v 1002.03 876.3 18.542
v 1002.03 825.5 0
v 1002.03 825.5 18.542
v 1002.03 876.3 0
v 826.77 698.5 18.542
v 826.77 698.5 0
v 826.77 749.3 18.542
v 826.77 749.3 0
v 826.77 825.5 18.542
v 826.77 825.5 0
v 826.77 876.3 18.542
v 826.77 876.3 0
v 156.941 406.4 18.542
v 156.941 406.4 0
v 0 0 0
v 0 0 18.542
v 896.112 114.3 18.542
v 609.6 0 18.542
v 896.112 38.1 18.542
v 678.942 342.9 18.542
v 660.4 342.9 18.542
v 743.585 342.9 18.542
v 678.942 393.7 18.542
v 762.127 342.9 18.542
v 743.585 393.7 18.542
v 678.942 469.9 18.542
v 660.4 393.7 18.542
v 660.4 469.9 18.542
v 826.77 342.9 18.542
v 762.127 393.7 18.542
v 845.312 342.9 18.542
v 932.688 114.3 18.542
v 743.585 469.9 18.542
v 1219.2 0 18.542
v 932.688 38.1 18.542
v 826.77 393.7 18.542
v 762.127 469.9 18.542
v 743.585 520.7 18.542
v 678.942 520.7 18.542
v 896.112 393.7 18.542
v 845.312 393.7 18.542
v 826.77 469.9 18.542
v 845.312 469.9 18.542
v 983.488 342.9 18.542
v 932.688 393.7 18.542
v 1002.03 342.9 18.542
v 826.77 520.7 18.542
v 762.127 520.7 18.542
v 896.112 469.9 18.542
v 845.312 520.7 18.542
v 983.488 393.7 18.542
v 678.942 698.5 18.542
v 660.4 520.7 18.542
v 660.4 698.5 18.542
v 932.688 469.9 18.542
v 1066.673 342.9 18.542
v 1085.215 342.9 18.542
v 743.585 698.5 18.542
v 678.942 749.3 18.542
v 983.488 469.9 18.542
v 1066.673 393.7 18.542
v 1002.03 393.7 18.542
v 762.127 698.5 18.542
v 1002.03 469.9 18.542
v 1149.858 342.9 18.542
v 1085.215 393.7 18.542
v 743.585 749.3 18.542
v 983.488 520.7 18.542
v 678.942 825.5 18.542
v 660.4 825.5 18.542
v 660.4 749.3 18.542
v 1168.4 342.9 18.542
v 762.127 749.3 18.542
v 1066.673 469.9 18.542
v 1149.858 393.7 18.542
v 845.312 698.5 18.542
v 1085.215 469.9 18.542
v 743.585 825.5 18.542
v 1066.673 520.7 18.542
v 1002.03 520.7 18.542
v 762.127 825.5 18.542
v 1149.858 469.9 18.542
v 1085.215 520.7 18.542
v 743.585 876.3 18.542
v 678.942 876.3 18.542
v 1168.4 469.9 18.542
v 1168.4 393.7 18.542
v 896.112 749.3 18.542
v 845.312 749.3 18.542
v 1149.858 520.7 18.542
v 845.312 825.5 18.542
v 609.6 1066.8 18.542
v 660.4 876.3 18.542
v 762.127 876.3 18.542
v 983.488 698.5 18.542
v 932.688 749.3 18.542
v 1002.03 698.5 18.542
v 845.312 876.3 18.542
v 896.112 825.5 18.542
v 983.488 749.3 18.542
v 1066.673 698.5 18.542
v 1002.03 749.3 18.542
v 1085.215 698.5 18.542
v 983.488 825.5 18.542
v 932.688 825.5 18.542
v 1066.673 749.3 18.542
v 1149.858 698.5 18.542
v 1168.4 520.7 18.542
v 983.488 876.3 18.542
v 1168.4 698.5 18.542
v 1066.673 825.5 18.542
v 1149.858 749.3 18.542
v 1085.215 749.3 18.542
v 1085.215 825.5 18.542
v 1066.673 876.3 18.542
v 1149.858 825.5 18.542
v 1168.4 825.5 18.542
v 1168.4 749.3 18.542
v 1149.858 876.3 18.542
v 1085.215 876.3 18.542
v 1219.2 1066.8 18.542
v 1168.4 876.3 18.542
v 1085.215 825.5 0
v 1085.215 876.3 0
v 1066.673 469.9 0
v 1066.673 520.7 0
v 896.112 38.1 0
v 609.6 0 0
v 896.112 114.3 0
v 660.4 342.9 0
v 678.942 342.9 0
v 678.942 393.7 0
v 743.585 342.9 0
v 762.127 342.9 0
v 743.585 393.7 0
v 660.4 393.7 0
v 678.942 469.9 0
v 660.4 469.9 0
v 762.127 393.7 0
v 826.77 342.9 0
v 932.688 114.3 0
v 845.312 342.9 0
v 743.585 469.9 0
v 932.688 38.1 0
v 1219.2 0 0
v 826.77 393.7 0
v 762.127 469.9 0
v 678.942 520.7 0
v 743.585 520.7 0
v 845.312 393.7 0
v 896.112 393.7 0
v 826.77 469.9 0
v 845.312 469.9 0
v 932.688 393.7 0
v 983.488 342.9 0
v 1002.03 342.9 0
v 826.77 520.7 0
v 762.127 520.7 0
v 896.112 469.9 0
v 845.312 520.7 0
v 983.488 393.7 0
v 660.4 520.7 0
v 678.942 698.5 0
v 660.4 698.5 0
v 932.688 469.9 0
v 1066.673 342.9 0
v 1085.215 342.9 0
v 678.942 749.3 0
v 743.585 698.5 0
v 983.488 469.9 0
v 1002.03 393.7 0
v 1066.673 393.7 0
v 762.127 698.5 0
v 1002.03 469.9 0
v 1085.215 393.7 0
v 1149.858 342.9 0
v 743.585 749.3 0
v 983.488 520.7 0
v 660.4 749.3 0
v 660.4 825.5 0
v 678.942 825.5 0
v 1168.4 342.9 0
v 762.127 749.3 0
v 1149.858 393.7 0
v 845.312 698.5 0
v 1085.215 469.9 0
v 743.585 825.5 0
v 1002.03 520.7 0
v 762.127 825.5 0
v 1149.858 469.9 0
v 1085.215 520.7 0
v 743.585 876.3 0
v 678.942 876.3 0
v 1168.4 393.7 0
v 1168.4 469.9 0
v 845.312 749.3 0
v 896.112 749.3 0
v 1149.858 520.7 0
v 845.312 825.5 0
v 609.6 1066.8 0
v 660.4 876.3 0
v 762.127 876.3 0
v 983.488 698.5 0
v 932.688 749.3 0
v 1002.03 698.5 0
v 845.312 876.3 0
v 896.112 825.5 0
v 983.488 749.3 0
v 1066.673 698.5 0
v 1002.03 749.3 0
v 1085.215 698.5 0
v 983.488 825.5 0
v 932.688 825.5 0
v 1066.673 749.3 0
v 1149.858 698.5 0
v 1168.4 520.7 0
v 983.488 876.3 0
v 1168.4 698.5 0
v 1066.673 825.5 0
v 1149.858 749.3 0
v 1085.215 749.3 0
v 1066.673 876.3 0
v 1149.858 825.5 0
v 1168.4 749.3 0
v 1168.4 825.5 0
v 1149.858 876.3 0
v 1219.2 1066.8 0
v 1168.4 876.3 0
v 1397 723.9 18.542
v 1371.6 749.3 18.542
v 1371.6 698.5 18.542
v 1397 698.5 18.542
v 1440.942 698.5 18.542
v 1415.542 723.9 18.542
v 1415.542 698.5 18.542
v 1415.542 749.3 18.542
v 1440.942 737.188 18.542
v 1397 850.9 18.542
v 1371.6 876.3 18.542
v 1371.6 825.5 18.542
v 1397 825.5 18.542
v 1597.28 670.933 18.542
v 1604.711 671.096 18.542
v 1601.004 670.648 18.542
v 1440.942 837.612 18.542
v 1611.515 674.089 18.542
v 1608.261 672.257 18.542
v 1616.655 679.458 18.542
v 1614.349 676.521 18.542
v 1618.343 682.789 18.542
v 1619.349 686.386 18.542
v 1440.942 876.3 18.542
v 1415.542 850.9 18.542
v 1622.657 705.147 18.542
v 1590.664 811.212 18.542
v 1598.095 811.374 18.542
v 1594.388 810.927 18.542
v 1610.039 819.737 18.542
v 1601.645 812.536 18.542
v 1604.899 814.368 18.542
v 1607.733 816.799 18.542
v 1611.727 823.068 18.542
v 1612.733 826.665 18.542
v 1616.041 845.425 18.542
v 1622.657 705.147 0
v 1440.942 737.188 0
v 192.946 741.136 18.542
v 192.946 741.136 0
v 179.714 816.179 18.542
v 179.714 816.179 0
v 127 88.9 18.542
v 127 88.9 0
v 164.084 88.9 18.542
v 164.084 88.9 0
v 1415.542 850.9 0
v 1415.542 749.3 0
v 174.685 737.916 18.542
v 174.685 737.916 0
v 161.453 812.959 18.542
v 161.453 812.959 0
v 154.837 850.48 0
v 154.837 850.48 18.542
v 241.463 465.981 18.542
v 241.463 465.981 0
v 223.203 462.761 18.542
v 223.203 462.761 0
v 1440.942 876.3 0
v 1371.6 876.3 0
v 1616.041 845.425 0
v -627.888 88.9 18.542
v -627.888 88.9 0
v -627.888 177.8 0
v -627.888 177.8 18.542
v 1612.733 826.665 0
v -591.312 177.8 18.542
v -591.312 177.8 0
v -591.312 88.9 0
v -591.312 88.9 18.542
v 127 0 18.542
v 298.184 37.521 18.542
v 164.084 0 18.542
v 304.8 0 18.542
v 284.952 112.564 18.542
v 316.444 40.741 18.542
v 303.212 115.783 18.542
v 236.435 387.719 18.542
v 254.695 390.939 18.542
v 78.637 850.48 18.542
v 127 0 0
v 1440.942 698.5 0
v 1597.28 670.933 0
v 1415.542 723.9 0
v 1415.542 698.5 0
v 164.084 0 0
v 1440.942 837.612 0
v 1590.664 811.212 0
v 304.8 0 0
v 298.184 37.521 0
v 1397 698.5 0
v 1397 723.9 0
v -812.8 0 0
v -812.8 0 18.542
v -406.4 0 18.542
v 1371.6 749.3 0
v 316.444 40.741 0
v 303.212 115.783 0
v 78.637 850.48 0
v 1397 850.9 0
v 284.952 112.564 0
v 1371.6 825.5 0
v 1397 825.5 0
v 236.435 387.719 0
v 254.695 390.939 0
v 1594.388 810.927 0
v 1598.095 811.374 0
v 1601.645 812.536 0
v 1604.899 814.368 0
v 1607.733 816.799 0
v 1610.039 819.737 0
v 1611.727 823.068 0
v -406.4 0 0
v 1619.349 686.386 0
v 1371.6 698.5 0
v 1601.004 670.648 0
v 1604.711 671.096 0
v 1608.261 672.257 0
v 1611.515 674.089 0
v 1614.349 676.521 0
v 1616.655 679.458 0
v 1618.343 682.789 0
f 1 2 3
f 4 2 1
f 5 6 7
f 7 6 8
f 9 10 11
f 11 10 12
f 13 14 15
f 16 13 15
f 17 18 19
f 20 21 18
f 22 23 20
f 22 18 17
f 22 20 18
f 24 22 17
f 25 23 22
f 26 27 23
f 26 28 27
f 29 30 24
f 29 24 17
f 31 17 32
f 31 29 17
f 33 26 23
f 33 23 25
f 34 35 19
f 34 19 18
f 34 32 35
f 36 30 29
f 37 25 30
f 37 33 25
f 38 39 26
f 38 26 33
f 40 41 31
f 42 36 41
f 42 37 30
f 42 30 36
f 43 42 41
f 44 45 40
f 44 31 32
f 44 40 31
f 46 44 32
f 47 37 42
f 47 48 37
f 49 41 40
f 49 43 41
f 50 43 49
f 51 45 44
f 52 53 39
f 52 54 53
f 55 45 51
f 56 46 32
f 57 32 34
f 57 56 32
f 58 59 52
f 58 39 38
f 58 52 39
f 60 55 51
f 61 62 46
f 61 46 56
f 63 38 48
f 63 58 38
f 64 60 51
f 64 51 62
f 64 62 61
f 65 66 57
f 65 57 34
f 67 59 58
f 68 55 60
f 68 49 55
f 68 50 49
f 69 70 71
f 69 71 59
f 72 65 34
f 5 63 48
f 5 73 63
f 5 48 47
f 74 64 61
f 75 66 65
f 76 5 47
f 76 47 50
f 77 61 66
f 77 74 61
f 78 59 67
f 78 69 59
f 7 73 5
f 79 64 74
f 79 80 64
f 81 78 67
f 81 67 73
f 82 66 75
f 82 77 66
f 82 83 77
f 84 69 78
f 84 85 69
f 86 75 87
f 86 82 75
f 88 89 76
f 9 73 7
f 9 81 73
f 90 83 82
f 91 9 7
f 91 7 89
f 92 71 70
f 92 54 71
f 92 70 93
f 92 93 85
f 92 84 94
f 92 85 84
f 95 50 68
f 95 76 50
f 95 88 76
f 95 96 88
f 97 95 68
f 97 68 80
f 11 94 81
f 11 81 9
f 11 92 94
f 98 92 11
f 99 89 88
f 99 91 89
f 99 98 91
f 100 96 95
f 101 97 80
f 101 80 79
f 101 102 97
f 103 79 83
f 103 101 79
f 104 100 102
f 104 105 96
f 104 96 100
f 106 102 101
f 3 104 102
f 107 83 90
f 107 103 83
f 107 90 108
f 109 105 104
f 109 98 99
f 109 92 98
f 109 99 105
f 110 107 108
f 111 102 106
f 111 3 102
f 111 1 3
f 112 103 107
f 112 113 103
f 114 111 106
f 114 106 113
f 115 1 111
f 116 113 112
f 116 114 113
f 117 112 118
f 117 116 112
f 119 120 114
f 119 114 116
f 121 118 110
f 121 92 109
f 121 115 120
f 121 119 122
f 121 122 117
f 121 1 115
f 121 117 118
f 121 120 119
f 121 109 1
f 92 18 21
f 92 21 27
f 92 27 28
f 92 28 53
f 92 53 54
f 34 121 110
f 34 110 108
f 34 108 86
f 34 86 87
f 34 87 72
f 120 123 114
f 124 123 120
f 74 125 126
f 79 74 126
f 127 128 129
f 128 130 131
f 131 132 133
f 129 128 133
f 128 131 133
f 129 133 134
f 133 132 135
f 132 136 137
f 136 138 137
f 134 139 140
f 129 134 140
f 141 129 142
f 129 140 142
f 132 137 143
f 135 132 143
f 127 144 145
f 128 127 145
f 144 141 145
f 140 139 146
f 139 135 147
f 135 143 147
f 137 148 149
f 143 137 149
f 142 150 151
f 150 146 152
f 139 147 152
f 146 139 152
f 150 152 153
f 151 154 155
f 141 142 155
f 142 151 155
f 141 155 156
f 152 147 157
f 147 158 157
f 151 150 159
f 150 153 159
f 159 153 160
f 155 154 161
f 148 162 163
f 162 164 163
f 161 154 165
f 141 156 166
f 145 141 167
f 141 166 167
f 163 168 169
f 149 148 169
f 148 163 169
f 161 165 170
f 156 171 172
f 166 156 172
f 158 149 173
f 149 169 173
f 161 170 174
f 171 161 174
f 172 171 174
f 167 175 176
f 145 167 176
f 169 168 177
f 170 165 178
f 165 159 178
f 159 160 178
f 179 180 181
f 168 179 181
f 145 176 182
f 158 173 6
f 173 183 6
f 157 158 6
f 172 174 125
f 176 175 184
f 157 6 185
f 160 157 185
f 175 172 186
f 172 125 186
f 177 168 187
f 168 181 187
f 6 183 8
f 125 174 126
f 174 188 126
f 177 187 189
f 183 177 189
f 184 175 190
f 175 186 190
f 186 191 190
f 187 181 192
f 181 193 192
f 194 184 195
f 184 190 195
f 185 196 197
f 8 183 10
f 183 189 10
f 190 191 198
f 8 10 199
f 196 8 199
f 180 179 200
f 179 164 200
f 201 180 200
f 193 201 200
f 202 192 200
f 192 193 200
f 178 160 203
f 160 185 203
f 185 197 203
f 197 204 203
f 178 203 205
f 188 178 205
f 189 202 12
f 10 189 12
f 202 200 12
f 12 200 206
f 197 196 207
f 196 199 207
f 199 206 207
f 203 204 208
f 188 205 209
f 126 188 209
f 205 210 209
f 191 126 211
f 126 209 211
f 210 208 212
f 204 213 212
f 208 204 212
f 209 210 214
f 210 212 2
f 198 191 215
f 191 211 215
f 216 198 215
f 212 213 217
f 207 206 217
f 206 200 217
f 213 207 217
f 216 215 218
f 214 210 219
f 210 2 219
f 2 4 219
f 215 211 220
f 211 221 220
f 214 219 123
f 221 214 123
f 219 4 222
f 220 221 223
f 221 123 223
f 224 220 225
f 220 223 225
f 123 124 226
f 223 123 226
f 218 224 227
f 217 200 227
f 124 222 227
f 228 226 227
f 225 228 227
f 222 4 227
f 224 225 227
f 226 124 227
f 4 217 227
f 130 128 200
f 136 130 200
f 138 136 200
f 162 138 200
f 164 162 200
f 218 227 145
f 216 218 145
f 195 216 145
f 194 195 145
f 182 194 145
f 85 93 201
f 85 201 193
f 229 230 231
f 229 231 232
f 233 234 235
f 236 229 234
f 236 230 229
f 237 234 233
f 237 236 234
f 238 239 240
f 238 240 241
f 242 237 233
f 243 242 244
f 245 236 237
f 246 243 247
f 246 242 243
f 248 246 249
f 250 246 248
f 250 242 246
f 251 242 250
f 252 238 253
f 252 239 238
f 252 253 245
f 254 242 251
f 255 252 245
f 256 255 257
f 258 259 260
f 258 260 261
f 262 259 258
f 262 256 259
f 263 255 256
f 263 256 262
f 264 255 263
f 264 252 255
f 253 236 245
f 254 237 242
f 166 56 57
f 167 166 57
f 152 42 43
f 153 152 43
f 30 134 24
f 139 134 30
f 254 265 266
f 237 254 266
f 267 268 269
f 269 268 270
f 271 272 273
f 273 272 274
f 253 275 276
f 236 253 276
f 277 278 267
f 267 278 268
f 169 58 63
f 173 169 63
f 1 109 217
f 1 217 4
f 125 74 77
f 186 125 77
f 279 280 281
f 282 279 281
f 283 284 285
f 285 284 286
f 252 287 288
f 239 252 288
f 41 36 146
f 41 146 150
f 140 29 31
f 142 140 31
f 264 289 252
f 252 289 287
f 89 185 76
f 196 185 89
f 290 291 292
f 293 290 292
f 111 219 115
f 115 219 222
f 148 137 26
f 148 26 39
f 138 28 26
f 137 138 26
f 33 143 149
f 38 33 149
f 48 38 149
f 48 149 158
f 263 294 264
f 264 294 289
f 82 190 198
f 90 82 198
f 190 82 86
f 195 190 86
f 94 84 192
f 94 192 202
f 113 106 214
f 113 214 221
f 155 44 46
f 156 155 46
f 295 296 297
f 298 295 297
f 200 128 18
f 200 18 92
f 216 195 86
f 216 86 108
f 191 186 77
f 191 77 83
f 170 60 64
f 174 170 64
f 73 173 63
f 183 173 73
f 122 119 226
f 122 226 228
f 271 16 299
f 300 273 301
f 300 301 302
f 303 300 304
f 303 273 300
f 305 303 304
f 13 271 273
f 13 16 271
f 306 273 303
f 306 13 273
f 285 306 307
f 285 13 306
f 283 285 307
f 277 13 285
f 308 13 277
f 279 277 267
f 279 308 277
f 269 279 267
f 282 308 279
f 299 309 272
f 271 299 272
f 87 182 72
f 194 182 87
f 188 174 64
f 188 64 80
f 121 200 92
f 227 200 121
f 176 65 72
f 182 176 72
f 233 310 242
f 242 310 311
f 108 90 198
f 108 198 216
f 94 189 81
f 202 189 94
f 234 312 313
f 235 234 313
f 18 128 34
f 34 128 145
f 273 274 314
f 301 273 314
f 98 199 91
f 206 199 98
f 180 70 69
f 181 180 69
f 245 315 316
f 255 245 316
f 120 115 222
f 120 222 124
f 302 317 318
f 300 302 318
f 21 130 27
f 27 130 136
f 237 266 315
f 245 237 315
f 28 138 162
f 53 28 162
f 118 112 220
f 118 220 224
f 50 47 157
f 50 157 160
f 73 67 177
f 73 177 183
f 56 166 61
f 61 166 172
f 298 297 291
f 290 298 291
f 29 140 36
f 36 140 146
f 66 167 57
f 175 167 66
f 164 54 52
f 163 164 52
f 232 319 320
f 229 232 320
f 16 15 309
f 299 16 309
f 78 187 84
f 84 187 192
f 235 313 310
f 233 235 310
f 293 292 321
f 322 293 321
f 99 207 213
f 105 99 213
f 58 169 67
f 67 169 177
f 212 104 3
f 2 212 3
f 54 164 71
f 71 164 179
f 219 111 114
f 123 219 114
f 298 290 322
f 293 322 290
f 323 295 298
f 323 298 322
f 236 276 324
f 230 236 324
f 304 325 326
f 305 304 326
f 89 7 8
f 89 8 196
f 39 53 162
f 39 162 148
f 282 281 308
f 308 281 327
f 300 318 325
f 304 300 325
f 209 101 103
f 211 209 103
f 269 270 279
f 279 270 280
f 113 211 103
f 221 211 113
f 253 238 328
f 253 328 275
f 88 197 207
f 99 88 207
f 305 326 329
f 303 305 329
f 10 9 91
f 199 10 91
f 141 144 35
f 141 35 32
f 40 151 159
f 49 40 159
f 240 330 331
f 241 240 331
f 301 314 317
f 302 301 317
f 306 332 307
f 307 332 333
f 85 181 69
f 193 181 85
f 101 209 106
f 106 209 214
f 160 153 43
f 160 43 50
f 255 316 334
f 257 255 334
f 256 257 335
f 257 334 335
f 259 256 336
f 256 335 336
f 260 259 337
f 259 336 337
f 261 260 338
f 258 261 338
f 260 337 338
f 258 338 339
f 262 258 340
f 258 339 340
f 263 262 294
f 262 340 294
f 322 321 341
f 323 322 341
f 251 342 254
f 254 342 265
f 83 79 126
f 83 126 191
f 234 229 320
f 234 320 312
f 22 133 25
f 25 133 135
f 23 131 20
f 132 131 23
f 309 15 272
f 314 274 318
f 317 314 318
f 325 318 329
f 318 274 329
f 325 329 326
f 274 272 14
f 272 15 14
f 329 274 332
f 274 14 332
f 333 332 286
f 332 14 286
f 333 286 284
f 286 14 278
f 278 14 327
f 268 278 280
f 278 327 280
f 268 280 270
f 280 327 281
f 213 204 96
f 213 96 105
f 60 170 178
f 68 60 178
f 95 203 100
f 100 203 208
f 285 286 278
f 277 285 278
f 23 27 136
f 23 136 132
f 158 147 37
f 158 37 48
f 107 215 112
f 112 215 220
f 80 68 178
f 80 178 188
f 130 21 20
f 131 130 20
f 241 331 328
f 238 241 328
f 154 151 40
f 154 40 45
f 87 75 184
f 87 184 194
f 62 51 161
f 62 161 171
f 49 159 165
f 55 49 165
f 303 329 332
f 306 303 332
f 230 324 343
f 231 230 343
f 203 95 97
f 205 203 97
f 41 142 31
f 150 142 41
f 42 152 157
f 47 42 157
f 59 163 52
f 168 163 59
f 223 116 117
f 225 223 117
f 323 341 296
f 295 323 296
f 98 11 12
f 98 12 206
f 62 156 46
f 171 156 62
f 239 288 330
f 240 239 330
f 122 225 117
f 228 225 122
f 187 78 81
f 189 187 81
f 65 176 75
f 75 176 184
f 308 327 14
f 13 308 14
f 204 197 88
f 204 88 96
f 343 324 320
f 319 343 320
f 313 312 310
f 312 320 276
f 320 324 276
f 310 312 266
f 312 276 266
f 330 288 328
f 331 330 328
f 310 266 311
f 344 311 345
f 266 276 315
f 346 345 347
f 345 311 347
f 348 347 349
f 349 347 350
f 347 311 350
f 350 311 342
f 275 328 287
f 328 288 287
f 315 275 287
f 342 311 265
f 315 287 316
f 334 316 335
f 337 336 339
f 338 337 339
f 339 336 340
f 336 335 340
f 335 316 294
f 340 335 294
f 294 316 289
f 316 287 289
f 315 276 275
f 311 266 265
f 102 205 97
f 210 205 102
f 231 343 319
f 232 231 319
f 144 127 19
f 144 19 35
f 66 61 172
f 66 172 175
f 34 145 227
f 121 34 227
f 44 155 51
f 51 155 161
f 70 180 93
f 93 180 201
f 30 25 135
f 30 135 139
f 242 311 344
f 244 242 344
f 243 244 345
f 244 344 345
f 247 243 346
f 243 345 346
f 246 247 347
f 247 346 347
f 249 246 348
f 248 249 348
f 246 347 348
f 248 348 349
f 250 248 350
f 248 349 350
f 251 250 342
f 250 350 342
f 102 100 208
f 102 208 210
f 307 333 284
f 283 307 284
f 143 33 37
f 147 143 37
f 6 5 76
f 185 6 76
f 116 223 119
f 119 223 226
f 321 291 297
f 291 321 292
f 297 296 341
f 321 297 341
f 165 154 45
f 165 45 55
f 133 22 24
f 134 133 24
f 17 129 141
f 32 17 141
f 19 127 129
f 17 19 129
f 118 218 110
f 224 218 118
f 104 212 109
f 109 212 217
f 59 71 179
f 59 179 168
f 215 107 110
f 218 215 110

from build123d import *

# Parameters (mm, degrees)
F0_W     = 609.6
F0_H     = 1066.8
F0_W_2   = 36.576
F0_H_2   = 76.2
F0_W_3   = 18.542
F0_H_3   = 50.8
F0_H_4   = 25.4
F1_DEPTH = 18.542


with BuildPart() as f1:
    # F0 (on Top) → F1 (new body)
    with BuildSketch(Plane.XY):
        Polygon((156.940715, 406.4), (0, 0), (127, 0), (127, 88.9), (164.084, 88.9), (164.084, 0), (304.8, 0), (298.184004, 37.521175), (284.952013, 112.563526), (236.434712, 387.718812), (223.202721, 462.761163), (174.68542, 737.916449), (161.453429, 812.9588), (154.837434, 850.479976), (78.637434, 850.479976), align=None)
        Polygon((179.713735, 816.178585), (161.453429, 812.9588), (174.68542, 737.916449), (192.945726, 741.136234), align=None)
        Polygon((241.463027, 465.980948), (223.202721, 462.761163), (236.434712, 387.718812), (254.695018, 390.938597), align=None)
        Polygon((284.952013, 112.563526), (298.184004, 37.521175), (316.44431, 40.74096), (303.212319, 115.783311), align=None)
        with Locations((914.4, 533.4)):
            Rectangle(F0_W, F0_H)
        with Locations((914.4, 76.2)):
            Rectangle(F0_W_2, F0_H_2, mode=Mode.SUBTRACT)
        with Locations((669.671, 368.3)):
            Rectangle(F0_W_3, F0_H_3, mode=Mode.SUBTRACT)
        with Locations((752.856, 368.3)):
            Rectangle(F0_W_3, F0_H_3, mode=Mode.SUBTRACT)
        with Locations((836.041, 368.3)):
            Rectangle(F0_W_3, F0_H_3, mode=Mode.SUBTRACT)
        with Locations((992.759, 368.3)):
            Rectangle(F0_W_3, F0_H_3, mode=Mode.SUBTRACT)
        with Locations((669.671, 495.3)):
            Rectangle(F0_W_3, F0_H_3, mode=Mode.SUBTRACT)
        with Locations((914.4, 431.8)):
            Rectangle(F0_W_2, F0_H_2, mode=Mode.SUBTRACT)
        with Locations((752.856, 495.3)):
            Rectangle(F0_W_3, F0_H_3, mode=Mode.SUBTRACT)
        with Locations((836.041, 495.3)):
            Rectangle(F0_W_3, F0_H_3, mode=Mode.SUBTRACT)
        with Locations((992.759, 495.3)):
            Rectangle(F0_W_3, F0_H_3, mode=Mode.SUBTRACT)
        with Locations((1075.944, 368.3)):
            Rectangle(F0_W_3, F0_H_3, mode=Mode.SUBTRACT)
        with Locations((1159.129, 368.3)):
            Rectangle(F0_W_3, F0_H_3, mode=Mode.SUBTRACT)
        with Locations((1075.944, 495.3)):
            Rectangle(F0_W_3, F0_H_3, mode=Mode.SUBTRACT)
        with Locations((1159.129, 495.3)):
            Rectangle(F0_W_3, F0_H_3, mode=Mode.SUBTRACT)
        with Locations((669.671, 723.9)):
            Rectangle(F0_W_3, F0_H_3, mode=Mode.SUBTRACT)
        with Locations((752.856, 723.9)):
            Rectangle(F0_W_3, F0_H_3, mode=Mode.SUBTRACT)
        with Locations((836.041, 723.9)):
            Rectangle(F0_W_3, F0_H_3, mode=Mode.SUBTRACT)
        with Locations((992.759, 723.9)):
            Rectangle(F0_W_3, F0_H_3, mode=Mode.SUBTRACT)
        with Locations((914.4, 787.4)):
            Rectangle(F0_W_2, F0_H_2, mode=Mode.SUBTRACT)
        with Locations((1075.944, 723.9)):
            Rectangle(F0_W_3, F0_H_3, mode=Mode.SUBTRACT)
        with Locations((1159.129, 723.9)):
            Rectangle(F0_W_3, F0_H_3, mode=Mode.SUBTRACT)
        with Locations((669.671, 850.9)):
            Rectangle(F0_W_3, F0_H_3, mode=Mode.SUBTRACT)
        with Locations((752.856, 850.9)):
            Rectangle(F0_W_3, F0_H_3, mode=Mode.SUBTRACT)
        with Locations((836.041, 850.9)):
            Rectangle(F0_W_3, F0_H_3, mode=Mode.SUBTRACT)
        with Locations((992.759, 850.9)):
            Rectangle(F0_W_3, F0_H_3, mode=Mode.SUBTRACT)
        with Locations((1075.944, 850.9)):
            Rectangle(F0_W_3, F0_H_3, mode=Mode.SUBTRACT)
        with Locations((1159.129, 850.9)):
            Rectangle(F0_W_3, F0_H_3, mode=Mode.SUBTRACT)
        with BuildLine():
            Line((1616.040818, 845.425354), (1440.942, 876.3))
            Line((1440.942, 876.3), (1440.942, 837.612246))
            Line((1440.942, 837.612246), (1590.664235, 811.212176))
            ThreePointArc((1590.664235, 811.212176), (1604.898864, 814.367918), (1612.732821, 826.664766))
            Line((1612.732821, 826.664766), (1616.040818, 845.425354))
        make_face()
        Polygon((1415.542, 876.3), (1415.542, 850.9), (1415.542, 749.3), (1415.542, 723.9), (1415.542, 698.5), (1440.942, 698.5), (1440.942, 737.187754), (1440.942, 837.612246), (1440.942, 876.3), align=None)
        with Locations((1406.271, 863.6)):
            Rectangle(F0_W_3, F0_H_4)
        Polygon((1371.6, 876.3), (1371.6, 825.5), (1397, 825.5), (1397, 850.9), (1397, 876.3), align=None)
        Polygon((1397, 723.9), (1397, 749.3), (1371.6, 749.3), (1371.6, 698.5), (1397, 698.5), align=None)
        with Locations((1406.271, 736.6)):
            Rectangle(F0_W_3, F0_H_4)
        with BuildLine():
            Line((1622.656814, 705.146529), (1440.942, 737.187754))
            Line((1440.942, 737.187754), (1440.942, 698.5))
            Line((1440.942, 698.5), (1597.280231, 670.933352))
            ThreePointArc((1597.280231, 670.933352), (1611.51486, 674.089093), (1619.348816, 686.385942))
            Line((1619.348816, 686.385942), (1622.656814, 705.146529))
        make_face()
        Polygon((-812.8, 0), (-406.4, 0), (-591.312, 177.8), (-591.312, 88.9), (-627.888, 88.9), (-627.888, 177.8), align=None)
    extrude(amount=F1_DEPTH)


solid = f1.part
